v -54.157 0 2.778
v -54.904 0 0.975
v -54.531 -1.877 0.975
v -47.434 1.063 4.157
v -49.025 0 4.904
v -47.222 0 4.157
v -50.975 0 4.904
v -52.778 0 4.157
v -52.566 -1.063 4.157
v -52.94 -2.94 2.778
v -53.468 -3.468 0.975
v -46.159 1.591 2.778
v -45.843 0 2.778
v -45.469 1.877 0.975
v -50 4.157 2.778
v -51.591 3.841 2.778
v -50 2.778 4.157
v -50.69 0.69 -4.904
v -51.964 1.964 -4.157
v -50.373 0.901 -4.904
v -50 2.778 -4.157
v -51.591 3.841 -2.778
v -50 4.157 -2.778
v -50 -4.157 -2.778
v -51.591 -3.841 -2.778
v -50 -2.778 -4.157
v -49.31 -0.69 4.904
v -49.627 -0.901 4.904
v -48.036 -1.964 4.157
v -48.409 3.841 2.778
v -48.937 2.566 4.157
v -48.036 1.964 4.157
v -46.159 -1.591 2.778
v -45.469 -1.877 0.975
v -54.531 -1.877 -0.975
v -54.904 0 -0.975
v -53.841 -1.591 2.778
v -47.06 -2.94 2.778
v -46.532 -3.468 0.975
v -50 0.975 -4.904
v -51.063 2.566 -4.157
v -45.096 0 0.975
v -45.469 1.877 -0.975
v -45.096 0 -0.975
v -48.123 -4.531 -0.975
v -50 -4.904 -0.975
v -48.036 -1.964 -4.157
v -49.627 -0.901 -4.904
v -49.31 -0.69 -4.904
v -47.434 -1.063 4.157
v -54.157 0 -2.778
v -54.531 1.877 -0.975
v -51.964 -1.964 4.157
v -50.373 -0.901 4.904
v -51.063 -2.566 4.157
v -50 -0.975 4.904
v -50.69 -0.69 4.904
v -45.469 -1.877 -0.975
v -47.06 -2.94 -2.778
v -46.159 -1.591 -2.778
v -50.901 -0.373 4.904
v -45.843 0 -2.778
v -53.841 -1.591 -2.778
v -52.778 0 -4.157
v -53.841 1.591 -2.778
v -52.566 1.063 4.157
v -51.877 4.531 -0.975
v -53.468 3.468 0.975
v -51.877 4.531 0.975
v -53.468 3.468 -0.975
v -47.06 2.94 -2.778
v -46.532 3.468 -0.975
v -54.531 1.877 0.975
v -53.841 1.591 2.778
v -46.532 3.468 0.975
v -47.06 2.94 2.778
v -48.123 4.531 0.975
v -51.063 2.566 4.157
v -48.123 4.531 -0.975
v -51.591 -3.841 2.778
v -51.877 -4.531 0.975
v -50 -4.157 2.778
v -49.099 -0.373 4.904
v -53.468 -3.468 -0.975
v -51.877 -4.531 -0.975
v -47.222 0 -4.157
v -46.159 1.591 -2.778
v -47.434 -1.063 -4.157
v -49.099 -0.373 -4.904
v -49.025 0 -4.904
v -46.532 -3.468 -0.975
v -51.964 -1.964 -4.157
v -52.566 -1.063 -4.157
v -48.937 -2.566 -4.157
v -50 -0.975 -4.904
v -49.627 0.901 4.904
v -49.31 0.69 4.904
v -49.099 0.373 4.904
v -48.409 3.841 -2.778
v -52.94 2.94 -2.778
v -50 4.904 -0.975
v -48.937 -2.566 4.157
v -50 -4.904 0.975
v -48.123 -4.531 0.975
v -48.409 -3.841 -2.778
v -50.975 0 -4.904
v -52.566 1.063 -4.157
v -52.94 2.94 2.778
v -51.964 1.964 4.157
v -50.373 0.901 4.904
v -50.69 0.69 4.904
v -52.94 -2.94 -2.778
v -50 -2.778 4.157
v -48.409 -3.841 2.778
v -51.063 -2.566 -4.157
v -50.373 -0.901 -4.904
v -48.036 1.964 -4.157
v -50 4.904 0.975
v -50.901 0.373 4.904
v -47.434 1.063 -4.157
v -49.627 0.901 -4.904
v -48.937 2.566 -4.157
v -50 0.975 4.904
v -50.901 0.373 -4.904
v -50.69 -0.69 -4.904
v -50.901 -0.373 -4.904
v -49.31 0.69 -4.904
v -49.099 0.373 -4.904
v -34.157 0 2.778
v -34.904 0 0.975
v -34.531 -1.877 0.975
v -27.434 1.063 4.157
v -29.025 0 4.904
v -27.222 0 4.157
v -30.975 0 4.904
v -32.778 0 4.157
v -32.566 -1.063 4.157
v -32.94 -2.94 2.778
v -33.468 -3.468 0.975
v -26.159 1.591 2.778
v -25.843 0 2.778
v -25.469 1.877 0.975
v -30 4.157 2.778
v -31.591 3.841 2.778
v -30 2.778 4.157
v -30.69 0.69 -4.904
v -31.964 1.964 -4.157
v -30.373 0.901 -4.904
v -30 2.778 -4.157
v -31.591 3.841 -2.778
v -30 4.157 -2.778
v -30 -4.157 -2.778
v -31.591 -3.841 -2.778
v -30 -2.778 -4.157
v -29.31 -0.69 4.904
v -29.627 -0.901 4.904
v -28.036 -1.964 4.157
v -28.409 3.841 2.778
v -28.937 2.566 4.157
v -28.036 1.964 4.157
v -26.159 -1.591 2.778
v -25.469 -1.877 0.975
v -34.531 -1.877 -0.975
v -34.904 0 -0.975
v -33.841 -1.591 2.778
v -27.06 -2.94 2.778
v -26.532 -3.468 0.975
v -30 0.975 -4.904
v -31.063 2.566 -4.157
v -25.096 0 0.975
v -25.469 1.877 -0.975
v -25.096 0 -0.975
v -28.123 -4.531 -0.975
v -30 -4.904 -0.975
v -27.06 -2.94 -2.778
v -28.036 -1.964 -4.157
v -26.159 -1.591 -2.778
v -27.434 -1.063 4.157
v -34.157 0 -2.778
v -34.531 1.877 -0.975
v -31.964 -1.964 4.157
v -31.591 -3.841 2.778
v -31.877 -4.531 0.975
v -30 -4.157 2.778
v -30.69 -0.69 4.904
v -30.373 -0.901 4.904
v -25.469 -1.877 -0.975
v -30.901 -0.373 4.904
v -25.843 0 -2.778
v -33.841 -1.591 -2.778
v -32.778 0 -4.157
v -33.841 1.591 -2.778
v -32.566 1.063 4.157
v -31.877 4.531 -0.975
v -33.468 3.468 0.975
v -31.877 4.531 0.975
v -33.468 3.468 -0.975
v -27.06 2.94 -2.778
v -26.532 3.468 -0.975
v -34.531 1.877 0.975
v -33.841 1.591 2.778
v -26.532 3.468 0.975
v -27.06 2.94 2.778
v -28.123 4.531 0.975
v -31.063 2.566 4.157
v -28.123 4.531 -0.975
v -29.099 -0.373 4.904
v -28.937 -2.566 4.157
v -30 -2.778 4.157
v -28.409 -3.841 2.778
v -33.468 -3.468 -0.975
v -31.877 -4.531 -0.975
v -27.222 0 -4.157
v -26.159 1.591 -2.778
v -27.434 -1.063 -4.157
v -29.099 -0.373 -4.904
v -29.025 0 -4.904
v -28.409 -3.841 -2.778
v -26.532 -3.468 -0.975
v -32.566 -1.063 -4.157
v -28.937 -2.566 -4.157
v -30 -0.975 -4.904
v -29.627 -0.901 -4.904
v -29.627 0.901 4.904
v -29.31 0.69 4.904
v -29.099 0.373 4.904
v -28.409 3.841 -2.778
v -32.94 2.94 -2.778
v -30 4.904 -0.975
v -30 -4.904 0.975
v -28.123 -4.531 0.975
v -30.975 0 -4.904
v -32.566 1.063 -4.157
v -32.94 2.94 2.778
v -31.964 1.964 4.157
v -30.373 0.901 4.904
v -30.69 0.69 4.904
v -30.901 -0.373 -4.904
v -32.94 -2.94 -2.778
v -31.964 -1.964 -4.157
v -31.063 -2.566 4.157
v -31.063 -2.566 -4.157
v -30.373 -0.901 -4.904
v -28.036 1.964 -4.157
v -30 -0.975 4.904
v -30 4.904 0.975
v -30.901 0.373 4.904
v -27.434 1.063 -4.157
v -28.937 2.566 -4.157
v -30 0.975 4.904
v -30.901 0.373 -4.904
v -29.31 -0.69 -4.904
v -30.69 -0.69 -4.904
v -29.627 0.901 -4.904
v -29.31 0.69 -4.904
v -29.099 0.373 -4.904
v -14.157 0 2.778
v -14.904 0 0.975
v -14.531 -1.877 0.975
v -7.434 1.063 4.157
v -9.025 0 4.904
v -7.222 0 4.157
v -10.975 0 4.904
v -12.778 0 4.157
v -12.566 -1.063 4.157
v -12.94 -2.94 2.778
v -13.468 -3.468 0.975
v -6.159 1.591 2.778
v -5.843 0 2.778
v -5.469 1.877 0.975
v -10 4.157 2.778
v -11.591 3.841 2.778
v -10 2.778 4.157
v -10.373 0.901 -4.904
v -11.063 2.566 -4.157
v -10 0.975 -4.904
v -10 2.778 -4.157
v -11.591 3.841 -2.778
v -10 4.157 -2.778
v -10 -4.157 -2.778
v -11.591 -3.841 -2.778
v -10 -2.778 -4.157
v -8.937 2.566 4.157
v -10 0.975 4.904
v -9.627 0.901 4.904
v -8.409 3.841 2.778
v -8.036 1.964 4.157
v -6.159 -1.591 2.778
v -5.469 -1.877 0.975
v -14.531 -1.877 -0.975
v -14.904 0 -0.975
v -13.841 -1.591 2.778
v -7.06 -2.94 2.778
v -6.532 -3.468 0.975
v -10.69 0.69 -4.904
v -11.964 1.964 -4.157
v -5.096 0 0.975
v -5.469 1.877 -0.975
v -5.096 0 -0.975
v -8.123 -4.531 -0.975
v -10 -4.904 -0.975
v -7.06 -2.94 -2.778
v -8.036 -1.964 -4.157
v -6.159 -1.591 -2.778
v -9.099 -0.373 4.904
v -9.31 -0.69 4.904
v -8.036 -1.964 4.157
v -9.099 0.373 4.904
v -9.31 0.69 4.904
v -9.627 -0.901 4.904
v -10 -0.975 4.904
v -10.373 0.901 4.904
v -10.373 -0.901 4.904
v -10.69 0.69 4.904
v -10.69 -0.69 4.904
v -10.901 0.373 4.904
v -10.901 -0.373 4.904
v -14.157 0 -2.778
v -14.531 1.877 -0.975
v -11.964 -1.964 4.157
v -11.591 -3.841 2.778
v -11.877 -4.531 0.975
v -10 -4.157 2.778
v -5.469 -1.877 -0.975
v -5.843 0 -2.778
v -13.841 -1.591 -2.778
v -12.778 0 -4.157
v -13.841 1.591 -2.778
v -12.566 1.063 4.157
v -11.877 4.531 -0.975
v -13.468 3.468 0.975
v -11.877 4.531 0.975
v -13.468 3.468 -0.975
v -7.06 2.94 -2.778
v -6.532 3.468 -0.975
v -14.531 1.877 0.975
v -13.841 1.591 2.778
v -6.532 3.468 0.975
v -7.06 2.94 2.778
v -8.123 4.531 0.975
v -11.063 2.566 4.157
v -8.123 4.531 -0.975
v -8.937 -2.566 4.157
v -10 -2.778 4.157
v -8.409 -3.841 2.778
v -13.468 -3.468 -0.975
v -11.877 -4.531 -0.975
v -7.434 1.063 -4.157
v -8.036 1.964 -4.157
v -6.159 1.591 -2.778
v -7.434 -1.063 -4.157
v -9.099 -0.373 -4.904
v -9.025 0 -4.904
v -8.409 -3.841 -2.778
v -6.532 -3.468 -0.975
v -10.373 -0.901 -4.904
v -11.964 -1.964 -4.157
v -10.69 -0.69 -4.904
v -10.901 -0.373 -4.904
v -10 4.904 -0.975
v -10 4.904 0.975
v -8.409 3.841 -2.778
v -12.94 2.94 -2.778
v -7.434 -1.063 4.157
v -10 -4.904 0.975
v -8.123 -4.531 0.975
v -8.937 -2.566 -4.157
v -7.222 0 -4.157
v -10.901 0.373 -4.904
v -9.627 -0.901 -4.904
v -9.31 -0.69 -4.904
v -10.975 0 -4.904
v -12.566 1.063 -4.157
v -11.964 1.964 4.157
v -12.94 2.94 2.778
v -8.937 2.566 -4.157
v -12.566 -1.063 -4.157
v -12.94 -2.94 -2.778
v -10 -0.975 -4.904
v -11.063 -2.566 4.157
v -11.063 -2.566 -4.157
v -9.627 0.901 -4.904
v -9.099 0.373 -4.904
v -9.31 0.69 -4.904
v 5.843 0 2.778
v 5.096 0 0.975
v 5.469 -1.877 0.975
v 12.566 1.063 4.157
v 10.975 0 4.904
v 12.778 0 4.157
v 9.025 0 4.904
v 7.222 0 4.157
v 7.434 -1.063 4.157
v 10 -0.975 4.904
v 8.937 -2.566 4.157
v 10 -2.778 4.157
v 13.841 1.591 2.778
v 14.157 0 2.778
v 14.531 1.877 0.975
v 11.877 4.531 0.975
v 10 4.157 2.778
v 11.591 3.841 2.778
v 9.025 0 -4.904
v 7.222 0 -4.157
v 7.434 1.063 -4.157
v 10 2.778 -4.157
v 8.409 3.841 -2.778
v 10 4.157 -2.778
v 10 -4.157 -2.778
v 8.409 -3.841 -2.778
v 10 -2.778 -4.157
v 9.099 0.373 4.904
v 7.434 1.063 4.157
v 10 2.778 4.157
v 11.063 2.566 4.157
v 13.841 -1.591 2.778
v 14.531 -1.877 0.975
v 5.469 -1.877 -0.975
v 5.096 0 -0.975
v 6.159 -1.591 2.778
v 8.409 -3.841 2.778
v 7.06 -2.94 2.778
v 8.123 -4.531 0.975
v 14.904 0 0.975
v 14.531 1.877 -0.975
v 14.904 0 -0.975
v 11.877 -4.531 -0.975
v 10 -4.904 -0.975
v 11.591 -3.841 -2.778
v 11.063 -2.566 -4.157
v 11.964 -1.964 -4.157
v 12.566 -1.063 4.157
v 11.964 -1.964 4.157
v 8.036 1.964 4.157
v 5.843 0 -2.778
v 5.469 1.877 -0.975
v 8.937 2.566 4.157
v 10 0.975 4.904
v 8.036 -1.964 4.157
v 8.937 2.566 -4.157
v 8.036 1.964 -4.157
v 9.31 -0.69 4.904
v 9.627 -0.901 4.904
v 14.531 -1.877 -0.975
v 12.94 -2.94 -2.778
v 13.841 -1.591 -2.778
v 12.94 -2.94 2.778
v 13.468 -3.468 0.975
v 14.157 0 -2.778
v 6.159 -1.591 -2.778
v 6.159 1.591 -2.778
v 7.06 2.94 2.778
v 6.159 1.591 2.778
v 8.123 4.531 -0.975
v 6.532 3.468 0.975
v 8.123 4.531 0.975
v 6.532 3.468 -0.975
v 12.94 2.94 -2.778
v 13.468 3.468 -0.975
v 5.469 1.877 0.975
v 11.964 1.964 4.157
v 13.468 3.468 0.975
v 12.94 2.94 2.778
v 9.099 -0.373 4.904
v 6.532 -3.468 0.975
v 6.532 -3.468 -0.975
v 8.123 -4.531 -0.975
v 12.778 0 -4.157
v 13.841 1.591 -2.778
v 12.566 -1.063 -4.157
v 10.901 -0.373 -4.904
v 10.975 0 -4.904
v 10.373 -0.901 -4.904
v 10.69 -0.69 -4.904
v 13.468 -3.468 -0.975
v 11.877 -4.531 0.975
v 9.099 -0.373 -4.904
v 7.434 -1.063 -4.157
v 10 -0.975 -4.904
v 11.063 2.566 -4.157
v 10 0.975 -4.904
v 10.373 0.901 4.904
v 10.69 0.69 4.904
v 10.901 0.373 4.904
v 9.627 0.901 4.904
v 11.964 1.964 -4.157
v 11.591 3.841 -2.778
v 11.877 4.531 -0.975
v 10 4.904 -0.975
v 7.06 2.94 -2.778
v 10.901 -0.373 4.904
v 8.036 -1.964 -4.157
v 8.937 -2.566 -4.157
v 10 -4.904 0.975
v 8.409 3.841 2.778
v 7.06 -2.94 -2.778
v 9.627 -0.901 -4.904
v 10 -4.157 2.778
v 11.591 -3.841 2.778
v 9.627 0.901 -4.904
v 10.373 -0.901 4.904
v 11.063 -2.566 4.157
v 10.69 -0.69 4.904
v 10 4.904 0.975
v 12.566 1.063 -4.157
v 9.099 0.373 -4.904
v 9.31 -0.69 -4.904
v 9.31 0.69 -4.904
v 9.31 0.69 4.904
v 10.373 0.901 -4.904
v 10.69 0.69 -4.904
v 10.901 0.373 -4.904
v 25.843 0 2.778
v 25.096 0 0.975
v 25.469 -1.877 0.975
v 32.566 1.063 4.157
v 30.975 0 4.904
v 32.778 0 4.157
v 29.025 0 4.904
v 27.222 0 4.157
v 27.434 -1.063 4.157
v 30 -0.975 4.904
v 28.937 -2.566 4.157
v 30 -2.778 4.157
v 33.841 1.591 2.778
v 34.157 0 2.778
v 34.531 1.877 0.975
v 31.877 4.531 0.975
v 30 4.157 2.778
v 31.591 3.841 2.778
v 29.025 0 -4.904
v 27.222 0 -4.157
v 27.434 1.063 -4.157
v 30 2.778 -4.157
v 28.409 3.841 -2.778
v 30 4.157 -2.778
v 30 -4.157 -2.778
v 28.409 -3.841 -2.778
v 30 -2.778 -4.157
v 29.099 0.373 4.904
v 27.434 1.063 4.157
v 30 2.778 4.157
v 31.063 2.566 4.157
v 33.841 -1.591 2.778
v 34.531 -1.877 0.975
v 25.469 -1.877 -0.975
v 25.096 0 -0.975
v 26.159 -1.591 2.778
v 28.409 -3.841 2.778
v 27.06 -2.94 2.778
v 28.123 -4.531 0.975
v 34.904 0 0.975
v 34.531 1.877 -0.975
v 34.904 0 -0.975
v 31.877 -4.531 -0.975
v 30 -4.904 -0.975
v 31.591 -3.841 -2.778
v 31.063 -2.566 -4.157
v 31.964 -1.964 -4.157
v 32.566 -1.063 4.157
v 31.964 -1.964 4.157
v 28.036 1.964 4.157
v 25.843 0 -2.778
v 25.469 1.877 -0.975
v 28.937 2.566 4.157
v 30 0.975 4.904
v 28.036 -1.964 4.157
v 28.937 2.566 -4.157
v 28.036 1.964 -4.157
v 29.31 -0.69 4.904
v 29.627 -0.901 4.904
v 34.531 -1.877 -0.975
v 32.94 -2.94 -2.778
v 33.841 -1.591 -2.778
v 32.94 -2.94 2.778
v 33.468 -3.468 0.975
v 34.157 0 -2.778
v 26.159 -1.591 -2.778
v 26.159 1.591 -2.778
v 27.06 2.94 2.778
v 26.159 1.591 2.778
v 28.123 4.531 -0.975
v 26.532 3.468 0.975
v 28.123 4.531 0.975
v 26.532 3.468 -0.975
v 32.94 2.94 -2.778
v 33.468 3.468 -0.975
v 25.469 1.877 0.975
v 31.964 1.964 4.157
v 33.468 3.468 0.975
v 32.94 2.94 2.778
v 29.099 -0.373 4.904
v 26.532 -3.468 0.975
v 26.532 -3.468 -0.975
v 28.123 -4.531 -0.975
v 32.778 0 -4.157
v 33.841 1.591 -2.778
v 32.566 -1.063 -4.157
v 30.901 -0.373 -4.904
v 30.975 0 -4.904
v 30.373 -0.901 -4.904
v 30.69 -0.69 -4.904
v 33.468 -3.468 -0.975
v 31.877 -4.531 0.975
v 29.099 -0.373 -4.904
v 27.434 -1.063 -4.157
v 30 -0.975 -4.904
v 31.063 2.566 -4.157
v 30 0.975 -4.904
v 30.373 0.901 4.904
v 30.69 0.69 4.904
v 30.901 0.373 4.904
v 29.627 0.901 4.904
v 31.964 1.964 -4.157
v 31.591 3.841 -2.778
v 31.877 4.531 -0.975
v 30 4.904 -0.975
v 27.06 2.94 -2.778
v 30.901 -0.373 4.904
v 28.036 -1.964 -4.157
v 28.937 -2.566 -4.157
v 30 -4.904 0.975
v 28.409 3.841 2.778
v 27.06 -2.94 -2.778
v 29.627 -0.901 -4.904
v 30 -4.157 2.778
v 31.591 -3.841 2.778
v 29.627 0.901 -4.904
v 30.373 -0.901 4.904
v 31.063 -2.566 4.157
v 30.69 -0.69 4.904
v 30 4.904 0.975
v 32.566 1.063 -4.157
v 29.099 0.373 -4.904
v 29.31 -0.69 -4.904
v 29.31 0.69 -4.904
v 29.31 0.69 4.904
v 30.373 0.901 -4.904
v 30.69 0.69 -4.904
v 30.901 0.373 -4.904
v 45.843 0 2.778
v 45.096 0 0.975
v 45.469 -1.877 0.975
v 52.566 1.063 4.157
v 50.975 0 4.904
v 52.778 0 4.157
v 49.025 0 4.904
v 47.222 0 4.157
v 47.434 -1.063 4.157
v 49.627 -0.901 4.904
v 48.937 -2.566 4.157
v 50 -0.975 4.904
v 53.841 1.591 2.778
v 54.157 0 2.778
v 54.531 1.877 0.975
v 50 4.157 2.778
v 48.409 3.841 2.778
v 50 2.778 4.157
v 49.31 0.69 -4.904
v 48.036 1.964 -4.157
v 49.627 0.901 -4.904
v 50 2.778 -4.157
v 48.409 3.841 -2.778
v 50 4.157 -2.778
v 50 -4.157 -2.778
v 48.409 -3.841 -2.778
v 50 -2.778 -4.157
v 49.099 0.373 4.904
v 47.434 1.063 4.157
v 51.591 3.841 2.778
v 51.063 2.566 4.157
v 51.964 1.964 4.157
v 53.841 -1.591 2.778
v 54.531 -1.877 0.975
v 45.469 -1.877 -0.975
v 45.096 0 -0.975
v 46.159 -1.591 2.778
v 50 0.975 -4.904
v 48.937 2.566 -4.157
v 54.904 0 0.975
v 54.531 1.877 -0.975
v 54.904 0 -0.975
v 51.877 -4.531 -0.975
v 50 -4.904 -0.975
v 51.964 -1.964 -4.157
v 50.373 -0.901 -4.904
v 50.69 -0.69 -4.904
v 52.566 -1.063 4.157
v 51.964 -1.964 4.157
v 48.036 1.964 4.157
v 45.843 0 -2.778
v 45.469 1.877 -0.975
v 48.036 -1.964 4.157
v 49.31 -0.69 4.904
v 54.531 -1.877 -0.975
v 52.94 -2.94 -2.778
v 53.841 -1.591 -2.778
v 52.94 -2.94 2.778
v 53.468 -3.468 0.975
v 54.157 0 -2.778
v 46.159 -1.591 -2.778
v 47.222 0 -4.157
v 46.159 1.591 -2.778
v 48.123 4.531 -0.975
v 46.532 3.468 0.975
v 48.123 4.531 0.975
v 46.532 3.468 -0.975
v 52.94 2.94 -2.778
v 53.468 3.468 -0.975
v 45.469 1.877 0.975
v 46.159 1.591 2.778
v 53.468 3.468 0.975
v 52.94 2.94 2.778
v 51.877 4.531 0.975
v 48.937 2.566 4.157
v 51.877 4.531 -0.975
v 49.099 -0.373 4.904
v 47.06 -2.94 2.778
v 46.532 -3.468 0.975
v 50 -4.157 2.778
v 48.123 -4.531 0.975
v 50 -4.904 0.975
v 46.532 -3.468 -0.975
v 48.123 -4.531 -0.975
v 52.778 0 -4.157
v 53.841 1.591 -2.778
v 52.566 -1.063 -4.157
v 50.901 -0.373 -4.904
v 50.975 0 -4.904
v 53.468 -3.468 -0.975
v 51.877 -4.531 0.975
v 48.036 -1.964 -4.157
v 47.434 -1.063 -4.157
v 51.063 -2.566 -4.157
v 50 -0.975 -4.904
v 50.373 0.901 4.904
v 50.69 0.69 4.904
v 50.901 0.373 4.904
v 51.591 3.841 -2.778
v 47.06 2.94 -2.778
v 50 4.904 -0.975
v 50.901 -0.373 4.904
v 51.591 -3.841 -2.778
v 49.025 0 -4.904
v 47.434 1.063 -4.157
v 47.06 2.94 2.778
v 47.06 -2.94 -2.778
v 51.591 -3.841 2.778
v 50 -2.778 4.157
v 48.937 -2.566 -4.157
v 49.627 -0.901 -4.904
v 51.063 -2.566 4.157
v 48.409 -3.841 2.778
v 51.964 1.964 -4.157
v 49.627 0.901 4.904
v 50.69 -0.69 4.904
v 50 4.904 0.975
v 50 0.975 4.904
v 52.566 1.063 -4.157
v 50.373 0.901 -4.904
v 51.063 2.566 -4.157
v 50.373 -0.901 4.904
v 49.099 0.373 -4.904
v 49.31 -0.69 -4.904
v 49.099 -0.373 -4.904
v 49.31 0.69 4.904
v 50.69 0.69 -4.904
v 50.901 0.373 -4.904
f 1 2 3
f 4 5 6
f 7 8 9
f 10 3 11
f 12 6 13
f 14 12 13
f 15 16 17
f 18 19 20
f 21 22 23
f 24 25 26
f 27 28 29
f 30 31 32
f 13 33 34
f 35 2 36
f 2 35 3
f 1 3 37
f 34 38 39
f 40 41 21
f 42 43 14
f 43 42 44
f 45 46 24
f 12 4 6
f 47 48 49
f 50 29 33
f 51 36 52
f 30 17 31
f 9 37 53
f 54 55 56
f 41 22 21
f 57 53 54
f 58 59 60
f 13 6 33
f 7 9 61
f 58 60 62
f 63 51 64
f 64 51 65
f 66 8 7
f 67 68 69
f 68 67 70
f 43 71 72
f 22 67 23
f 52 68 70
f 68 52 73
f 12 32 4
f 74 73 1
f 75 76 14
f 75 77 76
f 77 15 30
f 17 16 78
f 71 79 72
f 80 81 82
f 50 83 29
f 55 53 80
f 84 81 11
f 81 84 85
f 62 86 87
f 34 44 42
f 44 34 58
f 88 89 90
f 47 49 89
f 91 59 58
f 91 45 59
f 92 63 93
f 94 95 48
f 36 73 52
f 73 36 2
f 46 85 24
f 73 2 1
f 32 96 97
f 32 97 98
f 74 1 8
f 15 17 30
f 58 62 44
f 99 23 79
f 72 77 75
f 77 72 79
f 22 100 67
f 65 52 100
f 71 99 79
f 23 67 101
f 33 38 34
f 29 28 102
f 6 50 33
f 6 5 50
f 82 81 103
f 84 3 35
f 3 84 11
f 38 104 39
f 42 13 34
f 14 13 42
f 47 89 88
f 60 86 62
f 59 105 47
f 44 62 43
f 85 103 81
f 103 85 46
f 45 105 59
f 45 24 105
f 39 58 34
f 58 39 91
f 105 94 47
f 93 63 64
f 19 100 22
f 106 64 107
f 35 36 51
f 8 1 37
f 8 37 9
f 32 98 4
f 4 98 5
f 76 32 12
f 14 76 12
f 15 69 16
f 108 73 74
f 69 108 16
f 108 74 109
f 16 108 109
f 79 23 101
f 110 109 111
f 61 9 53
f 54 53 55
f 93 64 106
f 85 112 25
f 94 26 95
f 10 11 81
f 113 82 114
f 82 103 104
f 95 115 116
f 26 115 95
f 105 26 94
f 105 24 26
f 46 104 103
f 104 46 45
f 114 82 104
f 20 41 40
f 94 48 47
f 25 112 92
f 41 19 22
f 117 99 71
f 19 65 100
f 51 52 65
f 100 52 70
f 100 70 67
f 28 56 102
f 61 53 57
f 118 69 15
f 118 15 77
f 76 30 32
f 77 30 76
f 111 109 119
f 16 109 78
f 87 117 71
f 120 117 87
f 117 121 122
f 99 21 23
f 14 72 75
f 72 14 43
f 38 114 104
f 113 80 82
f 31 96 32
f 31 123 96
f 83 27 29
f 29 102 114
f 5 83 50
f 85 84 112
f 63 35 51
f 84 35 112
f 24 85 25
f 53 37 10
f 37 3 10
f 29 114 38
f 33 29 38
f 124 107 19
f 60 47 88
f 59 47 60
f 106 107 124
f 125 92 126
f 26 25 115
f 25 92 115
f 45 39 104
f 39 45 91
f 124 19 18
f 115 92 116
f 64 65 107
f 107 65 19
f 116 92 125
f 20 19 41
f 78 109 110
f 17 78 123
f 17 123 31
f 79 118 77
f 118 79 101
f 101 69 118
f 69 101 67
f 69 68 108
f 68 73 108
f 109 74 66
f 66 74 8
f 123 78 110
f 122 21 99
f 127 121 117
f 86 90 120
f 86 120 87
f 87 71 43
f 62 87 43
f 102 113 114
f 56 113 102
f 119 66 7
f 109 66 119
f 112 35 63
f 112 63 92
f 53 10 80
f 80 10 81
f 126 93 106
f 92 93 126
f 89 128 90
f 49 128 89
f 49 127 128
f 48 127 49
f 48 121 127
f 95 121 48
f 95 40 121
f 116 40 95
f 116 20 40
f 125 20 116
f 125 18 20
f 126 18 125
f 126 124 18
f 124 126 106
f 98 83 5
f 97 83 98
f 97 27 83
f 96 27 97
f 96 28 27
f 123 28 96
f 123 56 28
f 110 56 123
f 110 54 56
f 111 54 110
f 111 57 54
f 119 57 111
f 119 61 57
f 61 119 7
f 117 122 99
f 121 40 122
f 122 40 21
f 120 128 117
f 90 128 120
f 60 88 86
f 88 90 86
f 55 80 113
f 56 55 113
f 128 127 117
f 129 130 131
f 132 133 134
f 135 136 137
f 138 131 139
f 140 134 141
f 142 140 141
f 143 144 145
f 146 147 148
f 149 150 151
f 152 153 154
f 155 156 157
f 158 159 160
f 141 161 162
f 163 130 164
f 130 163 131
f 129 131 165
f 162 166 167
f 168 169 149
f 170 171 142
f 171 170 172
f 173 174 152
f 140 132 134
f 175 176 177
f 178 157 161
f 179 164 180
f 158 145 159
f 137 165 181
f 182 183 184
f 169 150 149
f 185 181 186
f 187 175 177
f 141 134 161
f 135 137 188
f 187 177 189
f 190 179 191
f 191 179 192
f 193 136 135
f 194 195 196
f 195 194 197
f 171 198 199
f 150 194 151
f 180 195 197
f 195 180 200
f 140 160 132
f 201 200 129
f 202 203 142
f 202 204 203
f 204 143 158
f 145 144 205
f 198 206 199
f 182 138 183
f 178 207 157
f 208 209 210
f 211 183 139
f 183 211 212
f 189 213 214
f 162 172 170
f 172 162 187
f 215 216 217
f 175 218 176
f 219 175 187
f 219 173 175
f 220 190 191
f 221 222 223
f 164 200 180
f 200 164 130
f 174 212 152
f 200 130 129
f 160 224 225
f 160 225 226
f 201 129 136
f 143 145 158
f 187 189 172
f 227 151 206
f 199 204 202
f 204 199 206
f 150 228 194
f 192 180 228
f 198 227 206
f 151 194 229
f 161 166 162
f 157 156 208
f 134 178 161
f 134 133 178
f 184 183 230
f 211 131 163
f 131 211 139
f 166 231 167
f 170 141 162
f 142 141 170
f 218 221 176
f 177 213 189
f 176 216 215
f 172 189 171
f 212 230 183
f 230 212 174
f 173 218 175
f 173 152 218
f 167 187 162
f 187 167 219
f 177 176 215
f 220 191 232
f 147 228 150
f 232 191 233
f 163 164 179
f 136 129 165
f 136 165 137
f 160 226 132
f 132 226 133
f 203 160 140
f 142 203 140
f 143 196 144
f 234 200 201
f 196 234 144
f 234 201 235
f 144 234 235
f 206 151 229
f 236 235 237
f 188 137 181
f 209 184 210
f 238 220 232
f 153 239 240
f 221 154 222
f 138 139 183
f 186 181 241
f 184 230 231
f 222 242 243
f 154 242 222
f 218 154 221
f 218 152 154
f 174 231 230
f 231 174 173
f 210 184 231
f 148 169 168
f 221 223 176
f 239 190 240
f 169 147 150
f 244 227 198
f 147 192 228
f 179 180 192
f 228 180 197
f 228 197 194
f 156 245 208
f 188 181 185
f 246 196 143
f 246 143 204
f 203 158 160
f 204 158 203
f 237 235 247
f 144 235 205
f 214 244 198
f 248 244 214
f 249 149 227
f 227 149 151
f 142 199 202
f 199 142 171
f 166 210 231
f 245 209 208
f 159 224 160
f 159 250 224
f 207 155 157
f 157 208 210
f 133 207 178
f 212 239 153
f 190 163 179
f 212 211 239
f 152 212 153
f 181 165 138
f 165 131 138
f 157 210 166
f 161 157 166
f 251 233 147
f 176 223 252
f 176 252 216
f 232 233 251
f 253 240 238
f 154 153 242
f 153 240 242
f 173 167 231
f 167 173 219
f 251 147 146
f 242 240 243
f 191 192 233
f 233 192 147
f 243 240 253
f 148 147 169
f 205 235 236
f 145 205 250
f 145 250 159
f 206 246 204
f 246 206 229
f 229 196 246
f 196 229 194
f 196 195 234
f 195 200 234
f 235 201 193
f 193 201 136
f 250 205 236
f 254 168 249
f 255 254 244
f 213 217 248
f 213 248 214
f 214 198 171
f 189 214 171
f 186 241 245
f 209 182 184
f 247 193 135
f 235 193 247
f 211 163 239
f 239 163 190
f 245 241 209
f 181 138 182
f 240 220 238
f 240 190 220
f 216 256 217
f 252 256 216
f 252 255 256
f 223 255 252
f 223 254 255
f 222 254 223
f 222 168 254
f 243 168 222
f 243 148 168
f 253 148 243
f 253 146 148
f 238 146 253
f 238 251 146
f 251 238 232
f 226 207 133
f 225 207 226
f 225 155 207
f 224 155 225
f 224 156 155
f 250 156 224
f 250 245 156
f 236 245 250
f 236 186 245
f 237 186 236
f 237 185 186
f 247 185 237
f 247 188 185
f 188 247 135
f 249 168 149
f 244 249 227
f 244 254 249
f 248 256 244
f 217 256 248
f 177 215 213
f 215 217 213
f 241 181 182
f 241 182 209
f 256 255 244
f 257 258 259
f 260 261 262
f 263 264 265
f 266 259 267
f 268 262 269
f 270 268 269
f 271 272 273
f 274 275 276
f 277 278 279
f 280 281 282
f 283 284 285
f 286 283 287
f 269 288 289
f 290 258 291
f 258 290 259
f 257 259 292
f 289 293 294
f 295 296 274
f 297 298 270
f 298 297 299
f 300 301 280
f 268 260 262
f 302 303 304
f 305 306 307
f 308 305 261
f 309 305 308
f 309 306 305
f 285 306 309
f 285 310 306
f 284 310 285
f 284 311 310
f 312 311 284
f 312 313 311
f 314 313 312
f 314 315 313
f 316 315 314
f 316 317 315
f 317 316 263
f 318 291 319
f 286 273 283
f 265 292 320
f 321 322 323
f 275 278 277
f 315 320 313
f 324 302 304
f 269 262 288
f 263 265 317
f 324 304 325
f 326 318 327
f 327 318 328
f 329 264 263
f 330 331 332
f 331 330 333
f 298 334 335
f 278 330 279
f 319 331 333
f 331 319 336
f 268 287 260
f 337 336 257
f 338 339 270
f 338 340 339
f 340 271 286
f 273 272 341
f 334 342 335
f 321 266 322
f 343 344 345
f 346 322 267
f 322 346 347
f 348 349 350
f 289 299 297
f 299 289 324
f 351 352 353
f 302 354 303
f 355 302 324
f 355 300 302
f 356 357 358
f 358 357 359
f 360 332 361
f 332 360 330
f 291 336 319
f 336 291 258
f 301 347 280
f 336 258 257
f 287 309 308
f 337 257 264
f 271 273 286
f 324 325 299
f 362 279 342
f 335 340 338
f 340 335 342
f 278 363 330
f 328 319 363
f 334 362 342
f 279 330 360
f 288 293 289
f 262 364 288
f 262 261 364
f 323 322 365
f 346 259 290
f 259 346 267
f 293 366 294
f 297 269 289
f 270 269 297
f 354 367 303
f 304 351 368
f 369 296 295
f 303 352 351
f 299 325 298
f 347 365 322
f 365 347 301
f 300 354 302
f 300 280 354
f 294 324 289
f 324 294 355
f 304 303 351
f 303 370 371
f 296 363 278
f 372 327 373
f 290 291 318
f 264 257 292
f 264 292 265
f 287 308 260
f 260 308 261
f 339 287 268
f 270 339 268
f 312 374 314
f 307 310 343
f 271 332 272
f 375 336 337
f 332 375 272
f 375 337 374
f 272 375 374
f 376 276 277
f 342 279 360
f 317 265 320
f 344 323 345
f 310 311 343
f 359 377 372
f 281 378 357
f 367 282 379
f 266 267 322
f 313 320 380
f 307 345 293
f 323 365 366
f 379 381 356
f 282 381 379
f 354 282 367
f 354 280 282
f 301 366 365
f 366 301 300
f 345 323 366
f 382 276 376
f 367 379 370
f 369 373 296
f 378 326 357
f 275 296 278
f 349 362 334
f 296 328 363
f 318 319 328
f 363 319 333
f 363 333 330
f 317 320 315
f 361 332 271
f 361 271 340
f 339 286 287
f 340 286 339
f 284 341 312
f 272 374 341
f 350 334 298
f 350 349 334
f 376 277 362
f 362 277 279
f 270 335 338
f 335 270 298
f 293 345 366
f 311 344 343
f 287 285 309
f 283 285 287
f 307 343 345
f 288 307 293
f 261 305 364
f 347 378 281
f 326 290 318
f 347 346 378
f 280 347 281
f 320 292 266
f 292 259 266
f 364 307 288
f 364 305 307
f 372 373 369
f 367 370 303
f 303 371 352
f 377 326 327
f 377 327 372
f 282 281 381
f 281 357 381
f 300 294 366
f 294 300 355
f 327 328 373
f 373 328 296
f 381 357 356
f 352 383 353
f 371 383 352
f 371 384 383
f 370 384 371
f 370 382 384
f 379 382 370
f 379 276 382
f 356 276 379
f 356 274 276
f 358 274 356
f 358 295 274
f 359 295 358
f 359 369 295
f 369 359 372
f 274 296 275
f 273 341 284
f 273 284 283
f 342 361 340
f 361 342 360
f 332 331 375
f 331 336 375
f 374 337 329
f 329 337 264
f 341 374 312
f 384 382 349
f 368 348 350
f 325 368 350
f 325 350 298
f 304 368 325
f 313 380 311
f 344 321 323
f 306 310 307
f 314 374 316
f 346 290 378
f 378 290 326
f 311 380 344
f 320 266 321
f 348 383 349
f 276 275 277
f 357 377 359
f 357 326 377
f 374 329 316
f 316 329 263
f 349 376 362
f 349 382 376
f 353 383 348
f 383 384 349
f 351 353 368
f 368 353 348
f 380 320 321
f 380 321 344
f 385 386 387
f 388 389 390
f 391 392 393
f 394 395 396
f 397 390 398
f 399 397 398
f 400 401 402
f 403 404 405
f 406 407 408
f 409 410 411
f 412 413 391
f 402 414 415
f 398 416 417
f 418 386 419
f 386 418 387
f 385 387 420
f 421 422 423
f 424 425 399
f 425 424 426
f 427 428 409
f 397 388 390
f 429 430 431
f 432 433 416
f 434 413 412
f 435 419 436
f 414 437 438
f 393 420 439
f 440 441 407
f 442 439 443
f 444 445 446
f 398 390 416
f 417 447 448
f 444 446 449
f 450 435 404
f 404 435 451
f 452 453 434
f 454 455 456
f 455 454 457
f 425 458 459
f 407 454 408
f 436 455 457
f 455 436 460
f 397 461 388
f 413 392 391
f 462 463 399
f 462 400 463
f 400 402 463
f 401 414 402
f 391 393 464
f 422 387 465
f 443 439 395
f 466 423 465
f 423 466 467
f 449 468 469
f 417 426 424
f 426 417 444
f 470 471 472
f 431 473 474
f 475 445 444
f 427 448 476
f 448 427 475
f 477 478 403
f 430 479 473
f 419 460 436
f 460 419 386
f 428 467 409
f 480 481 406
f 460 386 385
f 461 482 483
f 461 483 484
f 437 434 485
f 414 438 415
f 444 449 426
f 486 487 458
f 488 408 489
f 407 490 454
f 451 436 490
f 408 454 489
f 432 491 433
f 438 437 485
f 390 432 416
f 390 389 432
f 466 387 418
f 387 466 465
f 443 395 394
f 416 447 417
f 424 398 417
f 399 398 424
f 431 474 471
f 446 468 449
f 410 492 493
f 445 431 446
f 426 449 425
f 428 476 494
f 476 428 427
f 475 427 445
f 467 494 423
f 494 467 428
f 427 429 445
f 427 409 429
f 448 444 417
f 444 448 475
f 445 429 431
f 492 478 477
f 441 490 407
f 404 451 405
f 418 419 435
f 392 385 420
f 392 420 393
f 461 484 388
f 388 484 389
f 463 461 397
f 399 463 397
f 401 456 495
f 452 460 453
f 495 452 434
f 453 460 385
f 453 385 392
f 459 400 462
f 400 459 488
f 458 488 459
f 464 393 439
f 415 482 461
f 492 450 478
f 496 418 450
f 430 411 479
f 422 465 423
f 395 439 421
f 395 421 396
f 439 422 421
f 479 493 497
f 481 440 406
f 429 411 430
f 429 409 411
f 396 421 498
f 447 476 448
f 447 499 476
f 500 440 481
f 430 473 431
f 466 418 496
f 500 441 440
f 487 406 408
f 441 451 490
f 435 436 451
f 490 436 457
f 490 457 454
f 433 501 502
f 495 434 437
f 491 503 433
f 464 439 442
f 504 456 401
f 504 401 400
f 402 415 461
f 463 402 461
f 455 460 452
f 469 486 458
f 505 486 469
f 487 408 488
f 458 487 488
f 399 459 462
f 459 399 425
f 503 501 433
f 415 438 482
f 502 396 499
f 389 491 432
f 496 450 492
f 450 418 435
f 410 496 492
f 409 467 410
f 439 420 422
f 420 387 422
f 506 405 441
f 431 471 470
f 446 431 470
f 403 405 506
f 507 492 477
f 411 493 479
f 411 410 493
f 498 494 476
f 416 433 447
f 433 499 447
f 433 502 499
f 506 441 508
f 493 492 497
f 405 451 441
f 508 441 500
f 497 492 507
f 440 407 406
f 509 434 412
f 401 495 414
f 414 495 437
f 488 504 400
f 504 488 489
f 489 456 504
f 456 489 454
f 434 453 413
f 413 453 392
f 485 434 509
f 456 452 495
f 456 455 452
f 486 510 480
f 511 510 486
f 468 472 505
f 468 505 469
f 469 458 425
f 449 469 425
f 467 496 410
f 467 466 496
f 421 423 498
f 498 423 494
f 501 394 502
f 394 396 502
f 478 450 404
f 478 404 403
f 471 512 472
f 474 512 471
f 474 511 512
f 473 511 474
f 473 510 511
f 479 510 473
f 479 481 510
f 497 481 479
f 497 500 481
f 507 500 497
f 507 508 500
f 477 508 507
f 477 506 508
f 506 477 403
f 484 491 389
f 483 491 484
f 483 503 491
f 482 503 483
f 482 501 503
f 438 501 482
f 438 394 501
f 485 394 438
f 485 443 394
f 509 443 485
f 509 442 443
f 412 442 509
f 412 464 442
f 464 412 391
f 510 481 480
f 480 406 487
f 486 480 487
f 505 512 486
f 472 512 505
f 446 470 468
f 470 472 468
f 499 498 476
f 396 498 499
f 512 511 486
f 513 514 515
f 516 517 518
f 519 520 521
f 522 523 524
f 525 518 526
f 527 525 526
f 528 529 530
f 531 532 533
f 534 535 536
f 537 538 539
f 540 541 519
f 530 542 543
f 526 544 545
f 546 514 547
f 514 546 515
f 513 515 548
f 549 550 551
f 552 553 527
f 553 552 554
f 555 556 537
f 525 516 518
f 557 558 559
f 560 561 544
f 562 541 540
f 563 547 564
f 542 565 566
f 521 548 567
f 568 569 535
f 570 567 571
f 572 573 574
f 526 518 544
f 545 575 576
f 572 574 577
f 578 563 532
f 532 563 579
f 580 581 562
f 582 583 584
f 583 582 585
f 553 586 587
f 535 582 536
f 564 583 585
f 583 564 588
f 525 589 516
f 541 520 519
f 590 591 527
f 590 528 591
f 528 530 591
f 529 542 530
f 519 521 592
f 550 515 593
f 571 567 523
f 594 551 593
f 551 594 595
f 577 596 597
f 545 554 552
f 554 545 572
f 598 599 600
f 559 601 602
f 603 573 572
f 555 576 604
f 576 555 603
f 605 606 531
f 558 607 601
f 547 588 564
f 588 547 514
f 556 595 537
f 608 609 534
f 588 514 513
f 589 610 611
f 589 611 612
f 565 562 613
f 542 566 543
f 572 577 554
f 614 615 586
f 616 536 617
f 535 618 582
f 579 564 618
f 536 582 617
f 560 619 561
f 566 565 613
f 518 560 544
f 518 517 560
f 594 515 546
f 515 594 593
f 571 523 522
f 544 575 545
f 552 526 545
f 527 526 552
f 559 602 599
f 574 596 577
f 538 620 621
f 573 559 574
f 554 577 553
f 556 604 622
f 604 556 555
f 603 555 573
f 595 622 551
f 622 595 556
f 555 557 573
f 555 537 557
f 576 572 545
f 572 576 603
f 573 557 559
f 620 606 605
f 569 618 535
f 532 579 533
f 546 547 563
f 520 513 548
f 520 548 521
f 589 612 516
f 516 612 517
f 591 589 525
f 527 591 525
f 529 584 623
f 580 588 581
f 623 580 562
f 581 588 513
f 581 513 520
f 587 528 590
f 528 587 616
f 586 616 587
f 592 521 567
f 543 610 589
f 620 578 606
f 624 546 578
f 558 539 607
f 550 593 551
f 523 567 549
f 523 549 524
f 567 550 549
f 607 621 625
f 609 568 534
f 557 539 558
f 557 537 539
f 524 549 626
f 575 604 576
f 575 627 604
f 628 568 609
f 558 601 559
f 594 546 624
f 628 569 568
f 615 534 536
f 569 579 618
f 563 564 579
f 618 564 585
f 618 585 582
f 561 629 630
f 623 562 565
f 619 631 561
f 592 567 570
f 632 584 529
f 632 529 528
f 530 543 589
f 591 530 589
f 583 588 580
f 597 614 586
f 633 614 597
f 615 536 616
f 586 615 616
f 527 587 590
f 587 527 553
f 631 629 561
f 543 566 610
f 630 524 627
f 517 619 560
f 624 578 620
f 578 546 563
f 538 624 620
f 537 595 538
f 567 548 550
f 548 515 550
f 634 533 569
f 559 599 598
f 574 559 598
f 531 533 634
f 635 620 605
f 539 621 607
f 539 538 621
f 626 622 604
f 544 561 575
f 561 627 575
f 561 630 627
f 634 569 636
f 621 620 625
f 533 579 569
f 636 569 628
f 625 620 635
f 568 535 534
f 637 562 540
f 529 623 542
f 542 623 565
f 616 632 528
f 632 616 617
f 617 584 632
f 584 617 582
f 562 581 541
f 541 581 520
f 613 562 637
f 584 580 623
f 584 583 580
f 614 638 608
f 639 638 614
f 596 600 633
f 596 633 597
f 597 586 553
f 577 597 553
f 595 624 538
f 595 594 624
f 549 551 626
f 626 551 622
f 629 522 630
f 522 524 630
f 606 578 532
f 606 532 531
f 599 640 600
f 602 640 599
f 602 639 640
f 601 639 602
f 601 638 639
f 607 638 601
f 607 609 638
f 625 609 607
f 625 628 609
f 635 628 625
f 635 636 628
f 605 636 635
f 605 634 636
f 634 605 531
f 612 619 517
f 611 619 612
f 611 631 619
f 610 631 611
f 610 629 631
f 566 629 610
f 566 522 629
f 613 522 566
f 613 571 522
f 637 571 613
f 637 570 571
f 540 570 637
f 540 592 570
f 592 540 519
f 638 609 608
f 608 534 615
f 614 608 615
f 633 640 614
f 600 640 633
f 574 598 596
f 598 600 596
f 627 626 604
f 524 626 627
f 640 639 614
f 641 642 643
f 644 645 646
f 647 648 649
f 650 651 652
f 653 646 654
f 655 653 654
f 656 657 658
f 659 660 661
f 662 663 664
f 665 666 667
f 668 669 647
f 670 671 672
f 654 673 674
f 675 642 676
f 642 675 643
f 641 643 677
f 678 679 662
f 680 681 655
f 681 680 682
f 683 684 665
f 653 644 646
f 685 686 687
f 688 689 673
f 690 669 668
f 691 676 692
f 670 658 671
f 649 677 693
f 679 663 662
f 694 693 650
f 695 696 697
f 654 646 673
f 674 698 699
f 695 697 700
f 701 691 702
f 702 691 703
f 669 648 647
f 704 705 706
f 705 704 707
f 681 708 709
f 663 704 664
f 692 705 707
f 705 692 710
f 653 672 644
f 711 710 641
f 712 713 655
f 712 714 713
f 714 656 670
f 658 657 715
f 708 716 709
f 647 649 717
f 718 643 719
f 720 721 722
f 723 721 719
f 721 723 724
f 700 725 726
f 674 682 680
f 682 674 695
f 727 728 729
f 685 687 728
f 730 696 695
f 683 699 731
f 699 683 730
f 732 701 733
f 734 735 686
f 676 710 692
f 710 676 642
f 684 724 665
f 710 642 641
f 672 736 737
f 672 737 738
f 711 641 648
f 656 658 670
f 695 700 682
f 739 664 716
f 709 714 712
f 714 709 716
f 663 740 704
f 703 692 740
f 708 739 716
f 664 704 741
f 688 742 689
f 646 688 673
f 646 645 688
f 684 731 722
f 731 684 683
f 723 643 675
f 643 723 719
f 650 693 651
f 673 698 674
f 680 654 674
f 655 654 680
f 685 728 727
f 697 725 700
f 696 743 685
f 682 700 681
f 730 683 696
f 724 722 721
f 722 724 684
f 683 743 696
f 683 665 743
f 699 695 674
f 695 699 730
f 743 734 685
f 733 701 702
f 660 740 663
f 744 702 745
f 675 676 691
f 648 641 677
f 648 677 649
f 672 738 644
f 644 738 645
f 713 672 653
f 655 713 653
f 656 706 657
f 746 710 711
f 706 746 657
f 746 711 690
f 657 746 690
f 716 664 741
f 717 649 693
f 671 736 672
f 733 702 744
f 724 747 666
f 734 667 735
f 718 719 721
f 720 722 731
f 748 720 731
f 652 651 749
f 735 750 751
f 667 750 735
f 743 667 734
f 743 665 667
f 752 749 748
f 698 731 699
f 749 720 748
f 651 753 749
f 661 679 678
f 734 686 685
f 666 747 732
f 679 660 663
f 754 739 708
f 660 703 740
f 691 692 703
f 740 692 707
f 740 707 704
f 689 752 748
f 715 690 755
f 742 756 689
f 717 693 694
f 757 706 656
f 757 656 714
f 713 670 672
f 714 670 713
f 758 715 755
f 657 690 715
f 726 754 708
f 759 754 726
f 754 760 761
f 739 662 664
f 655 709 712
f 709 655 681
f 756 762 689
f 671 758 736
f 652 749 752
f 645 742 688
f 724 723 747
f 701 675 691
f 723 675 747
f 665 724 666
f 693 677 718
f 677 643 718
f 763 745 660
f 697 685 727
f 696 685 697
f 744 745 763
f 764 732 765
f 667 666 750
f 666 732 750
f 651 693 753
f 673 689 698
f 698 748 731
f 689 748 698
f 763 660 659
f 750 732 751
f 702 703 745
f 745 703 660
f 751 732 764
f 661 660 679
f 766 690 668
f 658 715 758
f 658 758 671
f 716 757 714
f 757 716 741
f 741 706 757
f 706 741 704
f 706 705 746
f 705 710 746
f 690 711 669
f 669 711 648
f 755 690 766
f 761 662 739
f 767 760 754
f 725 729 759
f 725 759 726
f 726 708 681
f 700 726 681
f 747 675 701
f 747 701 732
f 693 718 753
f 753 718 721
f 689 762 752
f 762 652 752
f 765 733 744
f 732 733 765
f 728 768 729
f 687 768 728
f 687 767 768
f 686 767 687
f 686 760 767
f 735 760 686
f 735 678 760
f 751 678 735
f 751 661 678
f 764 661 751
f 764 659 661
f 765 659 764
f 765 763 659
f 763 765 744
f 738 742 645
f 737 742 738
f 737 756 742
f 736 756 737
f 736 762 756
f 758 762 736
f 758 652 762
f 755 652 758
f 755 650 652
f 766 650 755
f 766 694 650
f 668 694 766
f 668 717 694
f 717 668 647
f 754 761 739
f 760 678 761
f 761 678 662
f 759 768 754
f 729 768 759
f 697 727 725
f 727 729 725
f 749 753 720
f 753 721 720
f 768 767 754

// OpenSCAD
inc=10;
d=5;

module object(inc, d) {
    for (a=[-50:inc:50])
        translate([a, 0, 0]) sphere(d);
}

object(20, 5);
